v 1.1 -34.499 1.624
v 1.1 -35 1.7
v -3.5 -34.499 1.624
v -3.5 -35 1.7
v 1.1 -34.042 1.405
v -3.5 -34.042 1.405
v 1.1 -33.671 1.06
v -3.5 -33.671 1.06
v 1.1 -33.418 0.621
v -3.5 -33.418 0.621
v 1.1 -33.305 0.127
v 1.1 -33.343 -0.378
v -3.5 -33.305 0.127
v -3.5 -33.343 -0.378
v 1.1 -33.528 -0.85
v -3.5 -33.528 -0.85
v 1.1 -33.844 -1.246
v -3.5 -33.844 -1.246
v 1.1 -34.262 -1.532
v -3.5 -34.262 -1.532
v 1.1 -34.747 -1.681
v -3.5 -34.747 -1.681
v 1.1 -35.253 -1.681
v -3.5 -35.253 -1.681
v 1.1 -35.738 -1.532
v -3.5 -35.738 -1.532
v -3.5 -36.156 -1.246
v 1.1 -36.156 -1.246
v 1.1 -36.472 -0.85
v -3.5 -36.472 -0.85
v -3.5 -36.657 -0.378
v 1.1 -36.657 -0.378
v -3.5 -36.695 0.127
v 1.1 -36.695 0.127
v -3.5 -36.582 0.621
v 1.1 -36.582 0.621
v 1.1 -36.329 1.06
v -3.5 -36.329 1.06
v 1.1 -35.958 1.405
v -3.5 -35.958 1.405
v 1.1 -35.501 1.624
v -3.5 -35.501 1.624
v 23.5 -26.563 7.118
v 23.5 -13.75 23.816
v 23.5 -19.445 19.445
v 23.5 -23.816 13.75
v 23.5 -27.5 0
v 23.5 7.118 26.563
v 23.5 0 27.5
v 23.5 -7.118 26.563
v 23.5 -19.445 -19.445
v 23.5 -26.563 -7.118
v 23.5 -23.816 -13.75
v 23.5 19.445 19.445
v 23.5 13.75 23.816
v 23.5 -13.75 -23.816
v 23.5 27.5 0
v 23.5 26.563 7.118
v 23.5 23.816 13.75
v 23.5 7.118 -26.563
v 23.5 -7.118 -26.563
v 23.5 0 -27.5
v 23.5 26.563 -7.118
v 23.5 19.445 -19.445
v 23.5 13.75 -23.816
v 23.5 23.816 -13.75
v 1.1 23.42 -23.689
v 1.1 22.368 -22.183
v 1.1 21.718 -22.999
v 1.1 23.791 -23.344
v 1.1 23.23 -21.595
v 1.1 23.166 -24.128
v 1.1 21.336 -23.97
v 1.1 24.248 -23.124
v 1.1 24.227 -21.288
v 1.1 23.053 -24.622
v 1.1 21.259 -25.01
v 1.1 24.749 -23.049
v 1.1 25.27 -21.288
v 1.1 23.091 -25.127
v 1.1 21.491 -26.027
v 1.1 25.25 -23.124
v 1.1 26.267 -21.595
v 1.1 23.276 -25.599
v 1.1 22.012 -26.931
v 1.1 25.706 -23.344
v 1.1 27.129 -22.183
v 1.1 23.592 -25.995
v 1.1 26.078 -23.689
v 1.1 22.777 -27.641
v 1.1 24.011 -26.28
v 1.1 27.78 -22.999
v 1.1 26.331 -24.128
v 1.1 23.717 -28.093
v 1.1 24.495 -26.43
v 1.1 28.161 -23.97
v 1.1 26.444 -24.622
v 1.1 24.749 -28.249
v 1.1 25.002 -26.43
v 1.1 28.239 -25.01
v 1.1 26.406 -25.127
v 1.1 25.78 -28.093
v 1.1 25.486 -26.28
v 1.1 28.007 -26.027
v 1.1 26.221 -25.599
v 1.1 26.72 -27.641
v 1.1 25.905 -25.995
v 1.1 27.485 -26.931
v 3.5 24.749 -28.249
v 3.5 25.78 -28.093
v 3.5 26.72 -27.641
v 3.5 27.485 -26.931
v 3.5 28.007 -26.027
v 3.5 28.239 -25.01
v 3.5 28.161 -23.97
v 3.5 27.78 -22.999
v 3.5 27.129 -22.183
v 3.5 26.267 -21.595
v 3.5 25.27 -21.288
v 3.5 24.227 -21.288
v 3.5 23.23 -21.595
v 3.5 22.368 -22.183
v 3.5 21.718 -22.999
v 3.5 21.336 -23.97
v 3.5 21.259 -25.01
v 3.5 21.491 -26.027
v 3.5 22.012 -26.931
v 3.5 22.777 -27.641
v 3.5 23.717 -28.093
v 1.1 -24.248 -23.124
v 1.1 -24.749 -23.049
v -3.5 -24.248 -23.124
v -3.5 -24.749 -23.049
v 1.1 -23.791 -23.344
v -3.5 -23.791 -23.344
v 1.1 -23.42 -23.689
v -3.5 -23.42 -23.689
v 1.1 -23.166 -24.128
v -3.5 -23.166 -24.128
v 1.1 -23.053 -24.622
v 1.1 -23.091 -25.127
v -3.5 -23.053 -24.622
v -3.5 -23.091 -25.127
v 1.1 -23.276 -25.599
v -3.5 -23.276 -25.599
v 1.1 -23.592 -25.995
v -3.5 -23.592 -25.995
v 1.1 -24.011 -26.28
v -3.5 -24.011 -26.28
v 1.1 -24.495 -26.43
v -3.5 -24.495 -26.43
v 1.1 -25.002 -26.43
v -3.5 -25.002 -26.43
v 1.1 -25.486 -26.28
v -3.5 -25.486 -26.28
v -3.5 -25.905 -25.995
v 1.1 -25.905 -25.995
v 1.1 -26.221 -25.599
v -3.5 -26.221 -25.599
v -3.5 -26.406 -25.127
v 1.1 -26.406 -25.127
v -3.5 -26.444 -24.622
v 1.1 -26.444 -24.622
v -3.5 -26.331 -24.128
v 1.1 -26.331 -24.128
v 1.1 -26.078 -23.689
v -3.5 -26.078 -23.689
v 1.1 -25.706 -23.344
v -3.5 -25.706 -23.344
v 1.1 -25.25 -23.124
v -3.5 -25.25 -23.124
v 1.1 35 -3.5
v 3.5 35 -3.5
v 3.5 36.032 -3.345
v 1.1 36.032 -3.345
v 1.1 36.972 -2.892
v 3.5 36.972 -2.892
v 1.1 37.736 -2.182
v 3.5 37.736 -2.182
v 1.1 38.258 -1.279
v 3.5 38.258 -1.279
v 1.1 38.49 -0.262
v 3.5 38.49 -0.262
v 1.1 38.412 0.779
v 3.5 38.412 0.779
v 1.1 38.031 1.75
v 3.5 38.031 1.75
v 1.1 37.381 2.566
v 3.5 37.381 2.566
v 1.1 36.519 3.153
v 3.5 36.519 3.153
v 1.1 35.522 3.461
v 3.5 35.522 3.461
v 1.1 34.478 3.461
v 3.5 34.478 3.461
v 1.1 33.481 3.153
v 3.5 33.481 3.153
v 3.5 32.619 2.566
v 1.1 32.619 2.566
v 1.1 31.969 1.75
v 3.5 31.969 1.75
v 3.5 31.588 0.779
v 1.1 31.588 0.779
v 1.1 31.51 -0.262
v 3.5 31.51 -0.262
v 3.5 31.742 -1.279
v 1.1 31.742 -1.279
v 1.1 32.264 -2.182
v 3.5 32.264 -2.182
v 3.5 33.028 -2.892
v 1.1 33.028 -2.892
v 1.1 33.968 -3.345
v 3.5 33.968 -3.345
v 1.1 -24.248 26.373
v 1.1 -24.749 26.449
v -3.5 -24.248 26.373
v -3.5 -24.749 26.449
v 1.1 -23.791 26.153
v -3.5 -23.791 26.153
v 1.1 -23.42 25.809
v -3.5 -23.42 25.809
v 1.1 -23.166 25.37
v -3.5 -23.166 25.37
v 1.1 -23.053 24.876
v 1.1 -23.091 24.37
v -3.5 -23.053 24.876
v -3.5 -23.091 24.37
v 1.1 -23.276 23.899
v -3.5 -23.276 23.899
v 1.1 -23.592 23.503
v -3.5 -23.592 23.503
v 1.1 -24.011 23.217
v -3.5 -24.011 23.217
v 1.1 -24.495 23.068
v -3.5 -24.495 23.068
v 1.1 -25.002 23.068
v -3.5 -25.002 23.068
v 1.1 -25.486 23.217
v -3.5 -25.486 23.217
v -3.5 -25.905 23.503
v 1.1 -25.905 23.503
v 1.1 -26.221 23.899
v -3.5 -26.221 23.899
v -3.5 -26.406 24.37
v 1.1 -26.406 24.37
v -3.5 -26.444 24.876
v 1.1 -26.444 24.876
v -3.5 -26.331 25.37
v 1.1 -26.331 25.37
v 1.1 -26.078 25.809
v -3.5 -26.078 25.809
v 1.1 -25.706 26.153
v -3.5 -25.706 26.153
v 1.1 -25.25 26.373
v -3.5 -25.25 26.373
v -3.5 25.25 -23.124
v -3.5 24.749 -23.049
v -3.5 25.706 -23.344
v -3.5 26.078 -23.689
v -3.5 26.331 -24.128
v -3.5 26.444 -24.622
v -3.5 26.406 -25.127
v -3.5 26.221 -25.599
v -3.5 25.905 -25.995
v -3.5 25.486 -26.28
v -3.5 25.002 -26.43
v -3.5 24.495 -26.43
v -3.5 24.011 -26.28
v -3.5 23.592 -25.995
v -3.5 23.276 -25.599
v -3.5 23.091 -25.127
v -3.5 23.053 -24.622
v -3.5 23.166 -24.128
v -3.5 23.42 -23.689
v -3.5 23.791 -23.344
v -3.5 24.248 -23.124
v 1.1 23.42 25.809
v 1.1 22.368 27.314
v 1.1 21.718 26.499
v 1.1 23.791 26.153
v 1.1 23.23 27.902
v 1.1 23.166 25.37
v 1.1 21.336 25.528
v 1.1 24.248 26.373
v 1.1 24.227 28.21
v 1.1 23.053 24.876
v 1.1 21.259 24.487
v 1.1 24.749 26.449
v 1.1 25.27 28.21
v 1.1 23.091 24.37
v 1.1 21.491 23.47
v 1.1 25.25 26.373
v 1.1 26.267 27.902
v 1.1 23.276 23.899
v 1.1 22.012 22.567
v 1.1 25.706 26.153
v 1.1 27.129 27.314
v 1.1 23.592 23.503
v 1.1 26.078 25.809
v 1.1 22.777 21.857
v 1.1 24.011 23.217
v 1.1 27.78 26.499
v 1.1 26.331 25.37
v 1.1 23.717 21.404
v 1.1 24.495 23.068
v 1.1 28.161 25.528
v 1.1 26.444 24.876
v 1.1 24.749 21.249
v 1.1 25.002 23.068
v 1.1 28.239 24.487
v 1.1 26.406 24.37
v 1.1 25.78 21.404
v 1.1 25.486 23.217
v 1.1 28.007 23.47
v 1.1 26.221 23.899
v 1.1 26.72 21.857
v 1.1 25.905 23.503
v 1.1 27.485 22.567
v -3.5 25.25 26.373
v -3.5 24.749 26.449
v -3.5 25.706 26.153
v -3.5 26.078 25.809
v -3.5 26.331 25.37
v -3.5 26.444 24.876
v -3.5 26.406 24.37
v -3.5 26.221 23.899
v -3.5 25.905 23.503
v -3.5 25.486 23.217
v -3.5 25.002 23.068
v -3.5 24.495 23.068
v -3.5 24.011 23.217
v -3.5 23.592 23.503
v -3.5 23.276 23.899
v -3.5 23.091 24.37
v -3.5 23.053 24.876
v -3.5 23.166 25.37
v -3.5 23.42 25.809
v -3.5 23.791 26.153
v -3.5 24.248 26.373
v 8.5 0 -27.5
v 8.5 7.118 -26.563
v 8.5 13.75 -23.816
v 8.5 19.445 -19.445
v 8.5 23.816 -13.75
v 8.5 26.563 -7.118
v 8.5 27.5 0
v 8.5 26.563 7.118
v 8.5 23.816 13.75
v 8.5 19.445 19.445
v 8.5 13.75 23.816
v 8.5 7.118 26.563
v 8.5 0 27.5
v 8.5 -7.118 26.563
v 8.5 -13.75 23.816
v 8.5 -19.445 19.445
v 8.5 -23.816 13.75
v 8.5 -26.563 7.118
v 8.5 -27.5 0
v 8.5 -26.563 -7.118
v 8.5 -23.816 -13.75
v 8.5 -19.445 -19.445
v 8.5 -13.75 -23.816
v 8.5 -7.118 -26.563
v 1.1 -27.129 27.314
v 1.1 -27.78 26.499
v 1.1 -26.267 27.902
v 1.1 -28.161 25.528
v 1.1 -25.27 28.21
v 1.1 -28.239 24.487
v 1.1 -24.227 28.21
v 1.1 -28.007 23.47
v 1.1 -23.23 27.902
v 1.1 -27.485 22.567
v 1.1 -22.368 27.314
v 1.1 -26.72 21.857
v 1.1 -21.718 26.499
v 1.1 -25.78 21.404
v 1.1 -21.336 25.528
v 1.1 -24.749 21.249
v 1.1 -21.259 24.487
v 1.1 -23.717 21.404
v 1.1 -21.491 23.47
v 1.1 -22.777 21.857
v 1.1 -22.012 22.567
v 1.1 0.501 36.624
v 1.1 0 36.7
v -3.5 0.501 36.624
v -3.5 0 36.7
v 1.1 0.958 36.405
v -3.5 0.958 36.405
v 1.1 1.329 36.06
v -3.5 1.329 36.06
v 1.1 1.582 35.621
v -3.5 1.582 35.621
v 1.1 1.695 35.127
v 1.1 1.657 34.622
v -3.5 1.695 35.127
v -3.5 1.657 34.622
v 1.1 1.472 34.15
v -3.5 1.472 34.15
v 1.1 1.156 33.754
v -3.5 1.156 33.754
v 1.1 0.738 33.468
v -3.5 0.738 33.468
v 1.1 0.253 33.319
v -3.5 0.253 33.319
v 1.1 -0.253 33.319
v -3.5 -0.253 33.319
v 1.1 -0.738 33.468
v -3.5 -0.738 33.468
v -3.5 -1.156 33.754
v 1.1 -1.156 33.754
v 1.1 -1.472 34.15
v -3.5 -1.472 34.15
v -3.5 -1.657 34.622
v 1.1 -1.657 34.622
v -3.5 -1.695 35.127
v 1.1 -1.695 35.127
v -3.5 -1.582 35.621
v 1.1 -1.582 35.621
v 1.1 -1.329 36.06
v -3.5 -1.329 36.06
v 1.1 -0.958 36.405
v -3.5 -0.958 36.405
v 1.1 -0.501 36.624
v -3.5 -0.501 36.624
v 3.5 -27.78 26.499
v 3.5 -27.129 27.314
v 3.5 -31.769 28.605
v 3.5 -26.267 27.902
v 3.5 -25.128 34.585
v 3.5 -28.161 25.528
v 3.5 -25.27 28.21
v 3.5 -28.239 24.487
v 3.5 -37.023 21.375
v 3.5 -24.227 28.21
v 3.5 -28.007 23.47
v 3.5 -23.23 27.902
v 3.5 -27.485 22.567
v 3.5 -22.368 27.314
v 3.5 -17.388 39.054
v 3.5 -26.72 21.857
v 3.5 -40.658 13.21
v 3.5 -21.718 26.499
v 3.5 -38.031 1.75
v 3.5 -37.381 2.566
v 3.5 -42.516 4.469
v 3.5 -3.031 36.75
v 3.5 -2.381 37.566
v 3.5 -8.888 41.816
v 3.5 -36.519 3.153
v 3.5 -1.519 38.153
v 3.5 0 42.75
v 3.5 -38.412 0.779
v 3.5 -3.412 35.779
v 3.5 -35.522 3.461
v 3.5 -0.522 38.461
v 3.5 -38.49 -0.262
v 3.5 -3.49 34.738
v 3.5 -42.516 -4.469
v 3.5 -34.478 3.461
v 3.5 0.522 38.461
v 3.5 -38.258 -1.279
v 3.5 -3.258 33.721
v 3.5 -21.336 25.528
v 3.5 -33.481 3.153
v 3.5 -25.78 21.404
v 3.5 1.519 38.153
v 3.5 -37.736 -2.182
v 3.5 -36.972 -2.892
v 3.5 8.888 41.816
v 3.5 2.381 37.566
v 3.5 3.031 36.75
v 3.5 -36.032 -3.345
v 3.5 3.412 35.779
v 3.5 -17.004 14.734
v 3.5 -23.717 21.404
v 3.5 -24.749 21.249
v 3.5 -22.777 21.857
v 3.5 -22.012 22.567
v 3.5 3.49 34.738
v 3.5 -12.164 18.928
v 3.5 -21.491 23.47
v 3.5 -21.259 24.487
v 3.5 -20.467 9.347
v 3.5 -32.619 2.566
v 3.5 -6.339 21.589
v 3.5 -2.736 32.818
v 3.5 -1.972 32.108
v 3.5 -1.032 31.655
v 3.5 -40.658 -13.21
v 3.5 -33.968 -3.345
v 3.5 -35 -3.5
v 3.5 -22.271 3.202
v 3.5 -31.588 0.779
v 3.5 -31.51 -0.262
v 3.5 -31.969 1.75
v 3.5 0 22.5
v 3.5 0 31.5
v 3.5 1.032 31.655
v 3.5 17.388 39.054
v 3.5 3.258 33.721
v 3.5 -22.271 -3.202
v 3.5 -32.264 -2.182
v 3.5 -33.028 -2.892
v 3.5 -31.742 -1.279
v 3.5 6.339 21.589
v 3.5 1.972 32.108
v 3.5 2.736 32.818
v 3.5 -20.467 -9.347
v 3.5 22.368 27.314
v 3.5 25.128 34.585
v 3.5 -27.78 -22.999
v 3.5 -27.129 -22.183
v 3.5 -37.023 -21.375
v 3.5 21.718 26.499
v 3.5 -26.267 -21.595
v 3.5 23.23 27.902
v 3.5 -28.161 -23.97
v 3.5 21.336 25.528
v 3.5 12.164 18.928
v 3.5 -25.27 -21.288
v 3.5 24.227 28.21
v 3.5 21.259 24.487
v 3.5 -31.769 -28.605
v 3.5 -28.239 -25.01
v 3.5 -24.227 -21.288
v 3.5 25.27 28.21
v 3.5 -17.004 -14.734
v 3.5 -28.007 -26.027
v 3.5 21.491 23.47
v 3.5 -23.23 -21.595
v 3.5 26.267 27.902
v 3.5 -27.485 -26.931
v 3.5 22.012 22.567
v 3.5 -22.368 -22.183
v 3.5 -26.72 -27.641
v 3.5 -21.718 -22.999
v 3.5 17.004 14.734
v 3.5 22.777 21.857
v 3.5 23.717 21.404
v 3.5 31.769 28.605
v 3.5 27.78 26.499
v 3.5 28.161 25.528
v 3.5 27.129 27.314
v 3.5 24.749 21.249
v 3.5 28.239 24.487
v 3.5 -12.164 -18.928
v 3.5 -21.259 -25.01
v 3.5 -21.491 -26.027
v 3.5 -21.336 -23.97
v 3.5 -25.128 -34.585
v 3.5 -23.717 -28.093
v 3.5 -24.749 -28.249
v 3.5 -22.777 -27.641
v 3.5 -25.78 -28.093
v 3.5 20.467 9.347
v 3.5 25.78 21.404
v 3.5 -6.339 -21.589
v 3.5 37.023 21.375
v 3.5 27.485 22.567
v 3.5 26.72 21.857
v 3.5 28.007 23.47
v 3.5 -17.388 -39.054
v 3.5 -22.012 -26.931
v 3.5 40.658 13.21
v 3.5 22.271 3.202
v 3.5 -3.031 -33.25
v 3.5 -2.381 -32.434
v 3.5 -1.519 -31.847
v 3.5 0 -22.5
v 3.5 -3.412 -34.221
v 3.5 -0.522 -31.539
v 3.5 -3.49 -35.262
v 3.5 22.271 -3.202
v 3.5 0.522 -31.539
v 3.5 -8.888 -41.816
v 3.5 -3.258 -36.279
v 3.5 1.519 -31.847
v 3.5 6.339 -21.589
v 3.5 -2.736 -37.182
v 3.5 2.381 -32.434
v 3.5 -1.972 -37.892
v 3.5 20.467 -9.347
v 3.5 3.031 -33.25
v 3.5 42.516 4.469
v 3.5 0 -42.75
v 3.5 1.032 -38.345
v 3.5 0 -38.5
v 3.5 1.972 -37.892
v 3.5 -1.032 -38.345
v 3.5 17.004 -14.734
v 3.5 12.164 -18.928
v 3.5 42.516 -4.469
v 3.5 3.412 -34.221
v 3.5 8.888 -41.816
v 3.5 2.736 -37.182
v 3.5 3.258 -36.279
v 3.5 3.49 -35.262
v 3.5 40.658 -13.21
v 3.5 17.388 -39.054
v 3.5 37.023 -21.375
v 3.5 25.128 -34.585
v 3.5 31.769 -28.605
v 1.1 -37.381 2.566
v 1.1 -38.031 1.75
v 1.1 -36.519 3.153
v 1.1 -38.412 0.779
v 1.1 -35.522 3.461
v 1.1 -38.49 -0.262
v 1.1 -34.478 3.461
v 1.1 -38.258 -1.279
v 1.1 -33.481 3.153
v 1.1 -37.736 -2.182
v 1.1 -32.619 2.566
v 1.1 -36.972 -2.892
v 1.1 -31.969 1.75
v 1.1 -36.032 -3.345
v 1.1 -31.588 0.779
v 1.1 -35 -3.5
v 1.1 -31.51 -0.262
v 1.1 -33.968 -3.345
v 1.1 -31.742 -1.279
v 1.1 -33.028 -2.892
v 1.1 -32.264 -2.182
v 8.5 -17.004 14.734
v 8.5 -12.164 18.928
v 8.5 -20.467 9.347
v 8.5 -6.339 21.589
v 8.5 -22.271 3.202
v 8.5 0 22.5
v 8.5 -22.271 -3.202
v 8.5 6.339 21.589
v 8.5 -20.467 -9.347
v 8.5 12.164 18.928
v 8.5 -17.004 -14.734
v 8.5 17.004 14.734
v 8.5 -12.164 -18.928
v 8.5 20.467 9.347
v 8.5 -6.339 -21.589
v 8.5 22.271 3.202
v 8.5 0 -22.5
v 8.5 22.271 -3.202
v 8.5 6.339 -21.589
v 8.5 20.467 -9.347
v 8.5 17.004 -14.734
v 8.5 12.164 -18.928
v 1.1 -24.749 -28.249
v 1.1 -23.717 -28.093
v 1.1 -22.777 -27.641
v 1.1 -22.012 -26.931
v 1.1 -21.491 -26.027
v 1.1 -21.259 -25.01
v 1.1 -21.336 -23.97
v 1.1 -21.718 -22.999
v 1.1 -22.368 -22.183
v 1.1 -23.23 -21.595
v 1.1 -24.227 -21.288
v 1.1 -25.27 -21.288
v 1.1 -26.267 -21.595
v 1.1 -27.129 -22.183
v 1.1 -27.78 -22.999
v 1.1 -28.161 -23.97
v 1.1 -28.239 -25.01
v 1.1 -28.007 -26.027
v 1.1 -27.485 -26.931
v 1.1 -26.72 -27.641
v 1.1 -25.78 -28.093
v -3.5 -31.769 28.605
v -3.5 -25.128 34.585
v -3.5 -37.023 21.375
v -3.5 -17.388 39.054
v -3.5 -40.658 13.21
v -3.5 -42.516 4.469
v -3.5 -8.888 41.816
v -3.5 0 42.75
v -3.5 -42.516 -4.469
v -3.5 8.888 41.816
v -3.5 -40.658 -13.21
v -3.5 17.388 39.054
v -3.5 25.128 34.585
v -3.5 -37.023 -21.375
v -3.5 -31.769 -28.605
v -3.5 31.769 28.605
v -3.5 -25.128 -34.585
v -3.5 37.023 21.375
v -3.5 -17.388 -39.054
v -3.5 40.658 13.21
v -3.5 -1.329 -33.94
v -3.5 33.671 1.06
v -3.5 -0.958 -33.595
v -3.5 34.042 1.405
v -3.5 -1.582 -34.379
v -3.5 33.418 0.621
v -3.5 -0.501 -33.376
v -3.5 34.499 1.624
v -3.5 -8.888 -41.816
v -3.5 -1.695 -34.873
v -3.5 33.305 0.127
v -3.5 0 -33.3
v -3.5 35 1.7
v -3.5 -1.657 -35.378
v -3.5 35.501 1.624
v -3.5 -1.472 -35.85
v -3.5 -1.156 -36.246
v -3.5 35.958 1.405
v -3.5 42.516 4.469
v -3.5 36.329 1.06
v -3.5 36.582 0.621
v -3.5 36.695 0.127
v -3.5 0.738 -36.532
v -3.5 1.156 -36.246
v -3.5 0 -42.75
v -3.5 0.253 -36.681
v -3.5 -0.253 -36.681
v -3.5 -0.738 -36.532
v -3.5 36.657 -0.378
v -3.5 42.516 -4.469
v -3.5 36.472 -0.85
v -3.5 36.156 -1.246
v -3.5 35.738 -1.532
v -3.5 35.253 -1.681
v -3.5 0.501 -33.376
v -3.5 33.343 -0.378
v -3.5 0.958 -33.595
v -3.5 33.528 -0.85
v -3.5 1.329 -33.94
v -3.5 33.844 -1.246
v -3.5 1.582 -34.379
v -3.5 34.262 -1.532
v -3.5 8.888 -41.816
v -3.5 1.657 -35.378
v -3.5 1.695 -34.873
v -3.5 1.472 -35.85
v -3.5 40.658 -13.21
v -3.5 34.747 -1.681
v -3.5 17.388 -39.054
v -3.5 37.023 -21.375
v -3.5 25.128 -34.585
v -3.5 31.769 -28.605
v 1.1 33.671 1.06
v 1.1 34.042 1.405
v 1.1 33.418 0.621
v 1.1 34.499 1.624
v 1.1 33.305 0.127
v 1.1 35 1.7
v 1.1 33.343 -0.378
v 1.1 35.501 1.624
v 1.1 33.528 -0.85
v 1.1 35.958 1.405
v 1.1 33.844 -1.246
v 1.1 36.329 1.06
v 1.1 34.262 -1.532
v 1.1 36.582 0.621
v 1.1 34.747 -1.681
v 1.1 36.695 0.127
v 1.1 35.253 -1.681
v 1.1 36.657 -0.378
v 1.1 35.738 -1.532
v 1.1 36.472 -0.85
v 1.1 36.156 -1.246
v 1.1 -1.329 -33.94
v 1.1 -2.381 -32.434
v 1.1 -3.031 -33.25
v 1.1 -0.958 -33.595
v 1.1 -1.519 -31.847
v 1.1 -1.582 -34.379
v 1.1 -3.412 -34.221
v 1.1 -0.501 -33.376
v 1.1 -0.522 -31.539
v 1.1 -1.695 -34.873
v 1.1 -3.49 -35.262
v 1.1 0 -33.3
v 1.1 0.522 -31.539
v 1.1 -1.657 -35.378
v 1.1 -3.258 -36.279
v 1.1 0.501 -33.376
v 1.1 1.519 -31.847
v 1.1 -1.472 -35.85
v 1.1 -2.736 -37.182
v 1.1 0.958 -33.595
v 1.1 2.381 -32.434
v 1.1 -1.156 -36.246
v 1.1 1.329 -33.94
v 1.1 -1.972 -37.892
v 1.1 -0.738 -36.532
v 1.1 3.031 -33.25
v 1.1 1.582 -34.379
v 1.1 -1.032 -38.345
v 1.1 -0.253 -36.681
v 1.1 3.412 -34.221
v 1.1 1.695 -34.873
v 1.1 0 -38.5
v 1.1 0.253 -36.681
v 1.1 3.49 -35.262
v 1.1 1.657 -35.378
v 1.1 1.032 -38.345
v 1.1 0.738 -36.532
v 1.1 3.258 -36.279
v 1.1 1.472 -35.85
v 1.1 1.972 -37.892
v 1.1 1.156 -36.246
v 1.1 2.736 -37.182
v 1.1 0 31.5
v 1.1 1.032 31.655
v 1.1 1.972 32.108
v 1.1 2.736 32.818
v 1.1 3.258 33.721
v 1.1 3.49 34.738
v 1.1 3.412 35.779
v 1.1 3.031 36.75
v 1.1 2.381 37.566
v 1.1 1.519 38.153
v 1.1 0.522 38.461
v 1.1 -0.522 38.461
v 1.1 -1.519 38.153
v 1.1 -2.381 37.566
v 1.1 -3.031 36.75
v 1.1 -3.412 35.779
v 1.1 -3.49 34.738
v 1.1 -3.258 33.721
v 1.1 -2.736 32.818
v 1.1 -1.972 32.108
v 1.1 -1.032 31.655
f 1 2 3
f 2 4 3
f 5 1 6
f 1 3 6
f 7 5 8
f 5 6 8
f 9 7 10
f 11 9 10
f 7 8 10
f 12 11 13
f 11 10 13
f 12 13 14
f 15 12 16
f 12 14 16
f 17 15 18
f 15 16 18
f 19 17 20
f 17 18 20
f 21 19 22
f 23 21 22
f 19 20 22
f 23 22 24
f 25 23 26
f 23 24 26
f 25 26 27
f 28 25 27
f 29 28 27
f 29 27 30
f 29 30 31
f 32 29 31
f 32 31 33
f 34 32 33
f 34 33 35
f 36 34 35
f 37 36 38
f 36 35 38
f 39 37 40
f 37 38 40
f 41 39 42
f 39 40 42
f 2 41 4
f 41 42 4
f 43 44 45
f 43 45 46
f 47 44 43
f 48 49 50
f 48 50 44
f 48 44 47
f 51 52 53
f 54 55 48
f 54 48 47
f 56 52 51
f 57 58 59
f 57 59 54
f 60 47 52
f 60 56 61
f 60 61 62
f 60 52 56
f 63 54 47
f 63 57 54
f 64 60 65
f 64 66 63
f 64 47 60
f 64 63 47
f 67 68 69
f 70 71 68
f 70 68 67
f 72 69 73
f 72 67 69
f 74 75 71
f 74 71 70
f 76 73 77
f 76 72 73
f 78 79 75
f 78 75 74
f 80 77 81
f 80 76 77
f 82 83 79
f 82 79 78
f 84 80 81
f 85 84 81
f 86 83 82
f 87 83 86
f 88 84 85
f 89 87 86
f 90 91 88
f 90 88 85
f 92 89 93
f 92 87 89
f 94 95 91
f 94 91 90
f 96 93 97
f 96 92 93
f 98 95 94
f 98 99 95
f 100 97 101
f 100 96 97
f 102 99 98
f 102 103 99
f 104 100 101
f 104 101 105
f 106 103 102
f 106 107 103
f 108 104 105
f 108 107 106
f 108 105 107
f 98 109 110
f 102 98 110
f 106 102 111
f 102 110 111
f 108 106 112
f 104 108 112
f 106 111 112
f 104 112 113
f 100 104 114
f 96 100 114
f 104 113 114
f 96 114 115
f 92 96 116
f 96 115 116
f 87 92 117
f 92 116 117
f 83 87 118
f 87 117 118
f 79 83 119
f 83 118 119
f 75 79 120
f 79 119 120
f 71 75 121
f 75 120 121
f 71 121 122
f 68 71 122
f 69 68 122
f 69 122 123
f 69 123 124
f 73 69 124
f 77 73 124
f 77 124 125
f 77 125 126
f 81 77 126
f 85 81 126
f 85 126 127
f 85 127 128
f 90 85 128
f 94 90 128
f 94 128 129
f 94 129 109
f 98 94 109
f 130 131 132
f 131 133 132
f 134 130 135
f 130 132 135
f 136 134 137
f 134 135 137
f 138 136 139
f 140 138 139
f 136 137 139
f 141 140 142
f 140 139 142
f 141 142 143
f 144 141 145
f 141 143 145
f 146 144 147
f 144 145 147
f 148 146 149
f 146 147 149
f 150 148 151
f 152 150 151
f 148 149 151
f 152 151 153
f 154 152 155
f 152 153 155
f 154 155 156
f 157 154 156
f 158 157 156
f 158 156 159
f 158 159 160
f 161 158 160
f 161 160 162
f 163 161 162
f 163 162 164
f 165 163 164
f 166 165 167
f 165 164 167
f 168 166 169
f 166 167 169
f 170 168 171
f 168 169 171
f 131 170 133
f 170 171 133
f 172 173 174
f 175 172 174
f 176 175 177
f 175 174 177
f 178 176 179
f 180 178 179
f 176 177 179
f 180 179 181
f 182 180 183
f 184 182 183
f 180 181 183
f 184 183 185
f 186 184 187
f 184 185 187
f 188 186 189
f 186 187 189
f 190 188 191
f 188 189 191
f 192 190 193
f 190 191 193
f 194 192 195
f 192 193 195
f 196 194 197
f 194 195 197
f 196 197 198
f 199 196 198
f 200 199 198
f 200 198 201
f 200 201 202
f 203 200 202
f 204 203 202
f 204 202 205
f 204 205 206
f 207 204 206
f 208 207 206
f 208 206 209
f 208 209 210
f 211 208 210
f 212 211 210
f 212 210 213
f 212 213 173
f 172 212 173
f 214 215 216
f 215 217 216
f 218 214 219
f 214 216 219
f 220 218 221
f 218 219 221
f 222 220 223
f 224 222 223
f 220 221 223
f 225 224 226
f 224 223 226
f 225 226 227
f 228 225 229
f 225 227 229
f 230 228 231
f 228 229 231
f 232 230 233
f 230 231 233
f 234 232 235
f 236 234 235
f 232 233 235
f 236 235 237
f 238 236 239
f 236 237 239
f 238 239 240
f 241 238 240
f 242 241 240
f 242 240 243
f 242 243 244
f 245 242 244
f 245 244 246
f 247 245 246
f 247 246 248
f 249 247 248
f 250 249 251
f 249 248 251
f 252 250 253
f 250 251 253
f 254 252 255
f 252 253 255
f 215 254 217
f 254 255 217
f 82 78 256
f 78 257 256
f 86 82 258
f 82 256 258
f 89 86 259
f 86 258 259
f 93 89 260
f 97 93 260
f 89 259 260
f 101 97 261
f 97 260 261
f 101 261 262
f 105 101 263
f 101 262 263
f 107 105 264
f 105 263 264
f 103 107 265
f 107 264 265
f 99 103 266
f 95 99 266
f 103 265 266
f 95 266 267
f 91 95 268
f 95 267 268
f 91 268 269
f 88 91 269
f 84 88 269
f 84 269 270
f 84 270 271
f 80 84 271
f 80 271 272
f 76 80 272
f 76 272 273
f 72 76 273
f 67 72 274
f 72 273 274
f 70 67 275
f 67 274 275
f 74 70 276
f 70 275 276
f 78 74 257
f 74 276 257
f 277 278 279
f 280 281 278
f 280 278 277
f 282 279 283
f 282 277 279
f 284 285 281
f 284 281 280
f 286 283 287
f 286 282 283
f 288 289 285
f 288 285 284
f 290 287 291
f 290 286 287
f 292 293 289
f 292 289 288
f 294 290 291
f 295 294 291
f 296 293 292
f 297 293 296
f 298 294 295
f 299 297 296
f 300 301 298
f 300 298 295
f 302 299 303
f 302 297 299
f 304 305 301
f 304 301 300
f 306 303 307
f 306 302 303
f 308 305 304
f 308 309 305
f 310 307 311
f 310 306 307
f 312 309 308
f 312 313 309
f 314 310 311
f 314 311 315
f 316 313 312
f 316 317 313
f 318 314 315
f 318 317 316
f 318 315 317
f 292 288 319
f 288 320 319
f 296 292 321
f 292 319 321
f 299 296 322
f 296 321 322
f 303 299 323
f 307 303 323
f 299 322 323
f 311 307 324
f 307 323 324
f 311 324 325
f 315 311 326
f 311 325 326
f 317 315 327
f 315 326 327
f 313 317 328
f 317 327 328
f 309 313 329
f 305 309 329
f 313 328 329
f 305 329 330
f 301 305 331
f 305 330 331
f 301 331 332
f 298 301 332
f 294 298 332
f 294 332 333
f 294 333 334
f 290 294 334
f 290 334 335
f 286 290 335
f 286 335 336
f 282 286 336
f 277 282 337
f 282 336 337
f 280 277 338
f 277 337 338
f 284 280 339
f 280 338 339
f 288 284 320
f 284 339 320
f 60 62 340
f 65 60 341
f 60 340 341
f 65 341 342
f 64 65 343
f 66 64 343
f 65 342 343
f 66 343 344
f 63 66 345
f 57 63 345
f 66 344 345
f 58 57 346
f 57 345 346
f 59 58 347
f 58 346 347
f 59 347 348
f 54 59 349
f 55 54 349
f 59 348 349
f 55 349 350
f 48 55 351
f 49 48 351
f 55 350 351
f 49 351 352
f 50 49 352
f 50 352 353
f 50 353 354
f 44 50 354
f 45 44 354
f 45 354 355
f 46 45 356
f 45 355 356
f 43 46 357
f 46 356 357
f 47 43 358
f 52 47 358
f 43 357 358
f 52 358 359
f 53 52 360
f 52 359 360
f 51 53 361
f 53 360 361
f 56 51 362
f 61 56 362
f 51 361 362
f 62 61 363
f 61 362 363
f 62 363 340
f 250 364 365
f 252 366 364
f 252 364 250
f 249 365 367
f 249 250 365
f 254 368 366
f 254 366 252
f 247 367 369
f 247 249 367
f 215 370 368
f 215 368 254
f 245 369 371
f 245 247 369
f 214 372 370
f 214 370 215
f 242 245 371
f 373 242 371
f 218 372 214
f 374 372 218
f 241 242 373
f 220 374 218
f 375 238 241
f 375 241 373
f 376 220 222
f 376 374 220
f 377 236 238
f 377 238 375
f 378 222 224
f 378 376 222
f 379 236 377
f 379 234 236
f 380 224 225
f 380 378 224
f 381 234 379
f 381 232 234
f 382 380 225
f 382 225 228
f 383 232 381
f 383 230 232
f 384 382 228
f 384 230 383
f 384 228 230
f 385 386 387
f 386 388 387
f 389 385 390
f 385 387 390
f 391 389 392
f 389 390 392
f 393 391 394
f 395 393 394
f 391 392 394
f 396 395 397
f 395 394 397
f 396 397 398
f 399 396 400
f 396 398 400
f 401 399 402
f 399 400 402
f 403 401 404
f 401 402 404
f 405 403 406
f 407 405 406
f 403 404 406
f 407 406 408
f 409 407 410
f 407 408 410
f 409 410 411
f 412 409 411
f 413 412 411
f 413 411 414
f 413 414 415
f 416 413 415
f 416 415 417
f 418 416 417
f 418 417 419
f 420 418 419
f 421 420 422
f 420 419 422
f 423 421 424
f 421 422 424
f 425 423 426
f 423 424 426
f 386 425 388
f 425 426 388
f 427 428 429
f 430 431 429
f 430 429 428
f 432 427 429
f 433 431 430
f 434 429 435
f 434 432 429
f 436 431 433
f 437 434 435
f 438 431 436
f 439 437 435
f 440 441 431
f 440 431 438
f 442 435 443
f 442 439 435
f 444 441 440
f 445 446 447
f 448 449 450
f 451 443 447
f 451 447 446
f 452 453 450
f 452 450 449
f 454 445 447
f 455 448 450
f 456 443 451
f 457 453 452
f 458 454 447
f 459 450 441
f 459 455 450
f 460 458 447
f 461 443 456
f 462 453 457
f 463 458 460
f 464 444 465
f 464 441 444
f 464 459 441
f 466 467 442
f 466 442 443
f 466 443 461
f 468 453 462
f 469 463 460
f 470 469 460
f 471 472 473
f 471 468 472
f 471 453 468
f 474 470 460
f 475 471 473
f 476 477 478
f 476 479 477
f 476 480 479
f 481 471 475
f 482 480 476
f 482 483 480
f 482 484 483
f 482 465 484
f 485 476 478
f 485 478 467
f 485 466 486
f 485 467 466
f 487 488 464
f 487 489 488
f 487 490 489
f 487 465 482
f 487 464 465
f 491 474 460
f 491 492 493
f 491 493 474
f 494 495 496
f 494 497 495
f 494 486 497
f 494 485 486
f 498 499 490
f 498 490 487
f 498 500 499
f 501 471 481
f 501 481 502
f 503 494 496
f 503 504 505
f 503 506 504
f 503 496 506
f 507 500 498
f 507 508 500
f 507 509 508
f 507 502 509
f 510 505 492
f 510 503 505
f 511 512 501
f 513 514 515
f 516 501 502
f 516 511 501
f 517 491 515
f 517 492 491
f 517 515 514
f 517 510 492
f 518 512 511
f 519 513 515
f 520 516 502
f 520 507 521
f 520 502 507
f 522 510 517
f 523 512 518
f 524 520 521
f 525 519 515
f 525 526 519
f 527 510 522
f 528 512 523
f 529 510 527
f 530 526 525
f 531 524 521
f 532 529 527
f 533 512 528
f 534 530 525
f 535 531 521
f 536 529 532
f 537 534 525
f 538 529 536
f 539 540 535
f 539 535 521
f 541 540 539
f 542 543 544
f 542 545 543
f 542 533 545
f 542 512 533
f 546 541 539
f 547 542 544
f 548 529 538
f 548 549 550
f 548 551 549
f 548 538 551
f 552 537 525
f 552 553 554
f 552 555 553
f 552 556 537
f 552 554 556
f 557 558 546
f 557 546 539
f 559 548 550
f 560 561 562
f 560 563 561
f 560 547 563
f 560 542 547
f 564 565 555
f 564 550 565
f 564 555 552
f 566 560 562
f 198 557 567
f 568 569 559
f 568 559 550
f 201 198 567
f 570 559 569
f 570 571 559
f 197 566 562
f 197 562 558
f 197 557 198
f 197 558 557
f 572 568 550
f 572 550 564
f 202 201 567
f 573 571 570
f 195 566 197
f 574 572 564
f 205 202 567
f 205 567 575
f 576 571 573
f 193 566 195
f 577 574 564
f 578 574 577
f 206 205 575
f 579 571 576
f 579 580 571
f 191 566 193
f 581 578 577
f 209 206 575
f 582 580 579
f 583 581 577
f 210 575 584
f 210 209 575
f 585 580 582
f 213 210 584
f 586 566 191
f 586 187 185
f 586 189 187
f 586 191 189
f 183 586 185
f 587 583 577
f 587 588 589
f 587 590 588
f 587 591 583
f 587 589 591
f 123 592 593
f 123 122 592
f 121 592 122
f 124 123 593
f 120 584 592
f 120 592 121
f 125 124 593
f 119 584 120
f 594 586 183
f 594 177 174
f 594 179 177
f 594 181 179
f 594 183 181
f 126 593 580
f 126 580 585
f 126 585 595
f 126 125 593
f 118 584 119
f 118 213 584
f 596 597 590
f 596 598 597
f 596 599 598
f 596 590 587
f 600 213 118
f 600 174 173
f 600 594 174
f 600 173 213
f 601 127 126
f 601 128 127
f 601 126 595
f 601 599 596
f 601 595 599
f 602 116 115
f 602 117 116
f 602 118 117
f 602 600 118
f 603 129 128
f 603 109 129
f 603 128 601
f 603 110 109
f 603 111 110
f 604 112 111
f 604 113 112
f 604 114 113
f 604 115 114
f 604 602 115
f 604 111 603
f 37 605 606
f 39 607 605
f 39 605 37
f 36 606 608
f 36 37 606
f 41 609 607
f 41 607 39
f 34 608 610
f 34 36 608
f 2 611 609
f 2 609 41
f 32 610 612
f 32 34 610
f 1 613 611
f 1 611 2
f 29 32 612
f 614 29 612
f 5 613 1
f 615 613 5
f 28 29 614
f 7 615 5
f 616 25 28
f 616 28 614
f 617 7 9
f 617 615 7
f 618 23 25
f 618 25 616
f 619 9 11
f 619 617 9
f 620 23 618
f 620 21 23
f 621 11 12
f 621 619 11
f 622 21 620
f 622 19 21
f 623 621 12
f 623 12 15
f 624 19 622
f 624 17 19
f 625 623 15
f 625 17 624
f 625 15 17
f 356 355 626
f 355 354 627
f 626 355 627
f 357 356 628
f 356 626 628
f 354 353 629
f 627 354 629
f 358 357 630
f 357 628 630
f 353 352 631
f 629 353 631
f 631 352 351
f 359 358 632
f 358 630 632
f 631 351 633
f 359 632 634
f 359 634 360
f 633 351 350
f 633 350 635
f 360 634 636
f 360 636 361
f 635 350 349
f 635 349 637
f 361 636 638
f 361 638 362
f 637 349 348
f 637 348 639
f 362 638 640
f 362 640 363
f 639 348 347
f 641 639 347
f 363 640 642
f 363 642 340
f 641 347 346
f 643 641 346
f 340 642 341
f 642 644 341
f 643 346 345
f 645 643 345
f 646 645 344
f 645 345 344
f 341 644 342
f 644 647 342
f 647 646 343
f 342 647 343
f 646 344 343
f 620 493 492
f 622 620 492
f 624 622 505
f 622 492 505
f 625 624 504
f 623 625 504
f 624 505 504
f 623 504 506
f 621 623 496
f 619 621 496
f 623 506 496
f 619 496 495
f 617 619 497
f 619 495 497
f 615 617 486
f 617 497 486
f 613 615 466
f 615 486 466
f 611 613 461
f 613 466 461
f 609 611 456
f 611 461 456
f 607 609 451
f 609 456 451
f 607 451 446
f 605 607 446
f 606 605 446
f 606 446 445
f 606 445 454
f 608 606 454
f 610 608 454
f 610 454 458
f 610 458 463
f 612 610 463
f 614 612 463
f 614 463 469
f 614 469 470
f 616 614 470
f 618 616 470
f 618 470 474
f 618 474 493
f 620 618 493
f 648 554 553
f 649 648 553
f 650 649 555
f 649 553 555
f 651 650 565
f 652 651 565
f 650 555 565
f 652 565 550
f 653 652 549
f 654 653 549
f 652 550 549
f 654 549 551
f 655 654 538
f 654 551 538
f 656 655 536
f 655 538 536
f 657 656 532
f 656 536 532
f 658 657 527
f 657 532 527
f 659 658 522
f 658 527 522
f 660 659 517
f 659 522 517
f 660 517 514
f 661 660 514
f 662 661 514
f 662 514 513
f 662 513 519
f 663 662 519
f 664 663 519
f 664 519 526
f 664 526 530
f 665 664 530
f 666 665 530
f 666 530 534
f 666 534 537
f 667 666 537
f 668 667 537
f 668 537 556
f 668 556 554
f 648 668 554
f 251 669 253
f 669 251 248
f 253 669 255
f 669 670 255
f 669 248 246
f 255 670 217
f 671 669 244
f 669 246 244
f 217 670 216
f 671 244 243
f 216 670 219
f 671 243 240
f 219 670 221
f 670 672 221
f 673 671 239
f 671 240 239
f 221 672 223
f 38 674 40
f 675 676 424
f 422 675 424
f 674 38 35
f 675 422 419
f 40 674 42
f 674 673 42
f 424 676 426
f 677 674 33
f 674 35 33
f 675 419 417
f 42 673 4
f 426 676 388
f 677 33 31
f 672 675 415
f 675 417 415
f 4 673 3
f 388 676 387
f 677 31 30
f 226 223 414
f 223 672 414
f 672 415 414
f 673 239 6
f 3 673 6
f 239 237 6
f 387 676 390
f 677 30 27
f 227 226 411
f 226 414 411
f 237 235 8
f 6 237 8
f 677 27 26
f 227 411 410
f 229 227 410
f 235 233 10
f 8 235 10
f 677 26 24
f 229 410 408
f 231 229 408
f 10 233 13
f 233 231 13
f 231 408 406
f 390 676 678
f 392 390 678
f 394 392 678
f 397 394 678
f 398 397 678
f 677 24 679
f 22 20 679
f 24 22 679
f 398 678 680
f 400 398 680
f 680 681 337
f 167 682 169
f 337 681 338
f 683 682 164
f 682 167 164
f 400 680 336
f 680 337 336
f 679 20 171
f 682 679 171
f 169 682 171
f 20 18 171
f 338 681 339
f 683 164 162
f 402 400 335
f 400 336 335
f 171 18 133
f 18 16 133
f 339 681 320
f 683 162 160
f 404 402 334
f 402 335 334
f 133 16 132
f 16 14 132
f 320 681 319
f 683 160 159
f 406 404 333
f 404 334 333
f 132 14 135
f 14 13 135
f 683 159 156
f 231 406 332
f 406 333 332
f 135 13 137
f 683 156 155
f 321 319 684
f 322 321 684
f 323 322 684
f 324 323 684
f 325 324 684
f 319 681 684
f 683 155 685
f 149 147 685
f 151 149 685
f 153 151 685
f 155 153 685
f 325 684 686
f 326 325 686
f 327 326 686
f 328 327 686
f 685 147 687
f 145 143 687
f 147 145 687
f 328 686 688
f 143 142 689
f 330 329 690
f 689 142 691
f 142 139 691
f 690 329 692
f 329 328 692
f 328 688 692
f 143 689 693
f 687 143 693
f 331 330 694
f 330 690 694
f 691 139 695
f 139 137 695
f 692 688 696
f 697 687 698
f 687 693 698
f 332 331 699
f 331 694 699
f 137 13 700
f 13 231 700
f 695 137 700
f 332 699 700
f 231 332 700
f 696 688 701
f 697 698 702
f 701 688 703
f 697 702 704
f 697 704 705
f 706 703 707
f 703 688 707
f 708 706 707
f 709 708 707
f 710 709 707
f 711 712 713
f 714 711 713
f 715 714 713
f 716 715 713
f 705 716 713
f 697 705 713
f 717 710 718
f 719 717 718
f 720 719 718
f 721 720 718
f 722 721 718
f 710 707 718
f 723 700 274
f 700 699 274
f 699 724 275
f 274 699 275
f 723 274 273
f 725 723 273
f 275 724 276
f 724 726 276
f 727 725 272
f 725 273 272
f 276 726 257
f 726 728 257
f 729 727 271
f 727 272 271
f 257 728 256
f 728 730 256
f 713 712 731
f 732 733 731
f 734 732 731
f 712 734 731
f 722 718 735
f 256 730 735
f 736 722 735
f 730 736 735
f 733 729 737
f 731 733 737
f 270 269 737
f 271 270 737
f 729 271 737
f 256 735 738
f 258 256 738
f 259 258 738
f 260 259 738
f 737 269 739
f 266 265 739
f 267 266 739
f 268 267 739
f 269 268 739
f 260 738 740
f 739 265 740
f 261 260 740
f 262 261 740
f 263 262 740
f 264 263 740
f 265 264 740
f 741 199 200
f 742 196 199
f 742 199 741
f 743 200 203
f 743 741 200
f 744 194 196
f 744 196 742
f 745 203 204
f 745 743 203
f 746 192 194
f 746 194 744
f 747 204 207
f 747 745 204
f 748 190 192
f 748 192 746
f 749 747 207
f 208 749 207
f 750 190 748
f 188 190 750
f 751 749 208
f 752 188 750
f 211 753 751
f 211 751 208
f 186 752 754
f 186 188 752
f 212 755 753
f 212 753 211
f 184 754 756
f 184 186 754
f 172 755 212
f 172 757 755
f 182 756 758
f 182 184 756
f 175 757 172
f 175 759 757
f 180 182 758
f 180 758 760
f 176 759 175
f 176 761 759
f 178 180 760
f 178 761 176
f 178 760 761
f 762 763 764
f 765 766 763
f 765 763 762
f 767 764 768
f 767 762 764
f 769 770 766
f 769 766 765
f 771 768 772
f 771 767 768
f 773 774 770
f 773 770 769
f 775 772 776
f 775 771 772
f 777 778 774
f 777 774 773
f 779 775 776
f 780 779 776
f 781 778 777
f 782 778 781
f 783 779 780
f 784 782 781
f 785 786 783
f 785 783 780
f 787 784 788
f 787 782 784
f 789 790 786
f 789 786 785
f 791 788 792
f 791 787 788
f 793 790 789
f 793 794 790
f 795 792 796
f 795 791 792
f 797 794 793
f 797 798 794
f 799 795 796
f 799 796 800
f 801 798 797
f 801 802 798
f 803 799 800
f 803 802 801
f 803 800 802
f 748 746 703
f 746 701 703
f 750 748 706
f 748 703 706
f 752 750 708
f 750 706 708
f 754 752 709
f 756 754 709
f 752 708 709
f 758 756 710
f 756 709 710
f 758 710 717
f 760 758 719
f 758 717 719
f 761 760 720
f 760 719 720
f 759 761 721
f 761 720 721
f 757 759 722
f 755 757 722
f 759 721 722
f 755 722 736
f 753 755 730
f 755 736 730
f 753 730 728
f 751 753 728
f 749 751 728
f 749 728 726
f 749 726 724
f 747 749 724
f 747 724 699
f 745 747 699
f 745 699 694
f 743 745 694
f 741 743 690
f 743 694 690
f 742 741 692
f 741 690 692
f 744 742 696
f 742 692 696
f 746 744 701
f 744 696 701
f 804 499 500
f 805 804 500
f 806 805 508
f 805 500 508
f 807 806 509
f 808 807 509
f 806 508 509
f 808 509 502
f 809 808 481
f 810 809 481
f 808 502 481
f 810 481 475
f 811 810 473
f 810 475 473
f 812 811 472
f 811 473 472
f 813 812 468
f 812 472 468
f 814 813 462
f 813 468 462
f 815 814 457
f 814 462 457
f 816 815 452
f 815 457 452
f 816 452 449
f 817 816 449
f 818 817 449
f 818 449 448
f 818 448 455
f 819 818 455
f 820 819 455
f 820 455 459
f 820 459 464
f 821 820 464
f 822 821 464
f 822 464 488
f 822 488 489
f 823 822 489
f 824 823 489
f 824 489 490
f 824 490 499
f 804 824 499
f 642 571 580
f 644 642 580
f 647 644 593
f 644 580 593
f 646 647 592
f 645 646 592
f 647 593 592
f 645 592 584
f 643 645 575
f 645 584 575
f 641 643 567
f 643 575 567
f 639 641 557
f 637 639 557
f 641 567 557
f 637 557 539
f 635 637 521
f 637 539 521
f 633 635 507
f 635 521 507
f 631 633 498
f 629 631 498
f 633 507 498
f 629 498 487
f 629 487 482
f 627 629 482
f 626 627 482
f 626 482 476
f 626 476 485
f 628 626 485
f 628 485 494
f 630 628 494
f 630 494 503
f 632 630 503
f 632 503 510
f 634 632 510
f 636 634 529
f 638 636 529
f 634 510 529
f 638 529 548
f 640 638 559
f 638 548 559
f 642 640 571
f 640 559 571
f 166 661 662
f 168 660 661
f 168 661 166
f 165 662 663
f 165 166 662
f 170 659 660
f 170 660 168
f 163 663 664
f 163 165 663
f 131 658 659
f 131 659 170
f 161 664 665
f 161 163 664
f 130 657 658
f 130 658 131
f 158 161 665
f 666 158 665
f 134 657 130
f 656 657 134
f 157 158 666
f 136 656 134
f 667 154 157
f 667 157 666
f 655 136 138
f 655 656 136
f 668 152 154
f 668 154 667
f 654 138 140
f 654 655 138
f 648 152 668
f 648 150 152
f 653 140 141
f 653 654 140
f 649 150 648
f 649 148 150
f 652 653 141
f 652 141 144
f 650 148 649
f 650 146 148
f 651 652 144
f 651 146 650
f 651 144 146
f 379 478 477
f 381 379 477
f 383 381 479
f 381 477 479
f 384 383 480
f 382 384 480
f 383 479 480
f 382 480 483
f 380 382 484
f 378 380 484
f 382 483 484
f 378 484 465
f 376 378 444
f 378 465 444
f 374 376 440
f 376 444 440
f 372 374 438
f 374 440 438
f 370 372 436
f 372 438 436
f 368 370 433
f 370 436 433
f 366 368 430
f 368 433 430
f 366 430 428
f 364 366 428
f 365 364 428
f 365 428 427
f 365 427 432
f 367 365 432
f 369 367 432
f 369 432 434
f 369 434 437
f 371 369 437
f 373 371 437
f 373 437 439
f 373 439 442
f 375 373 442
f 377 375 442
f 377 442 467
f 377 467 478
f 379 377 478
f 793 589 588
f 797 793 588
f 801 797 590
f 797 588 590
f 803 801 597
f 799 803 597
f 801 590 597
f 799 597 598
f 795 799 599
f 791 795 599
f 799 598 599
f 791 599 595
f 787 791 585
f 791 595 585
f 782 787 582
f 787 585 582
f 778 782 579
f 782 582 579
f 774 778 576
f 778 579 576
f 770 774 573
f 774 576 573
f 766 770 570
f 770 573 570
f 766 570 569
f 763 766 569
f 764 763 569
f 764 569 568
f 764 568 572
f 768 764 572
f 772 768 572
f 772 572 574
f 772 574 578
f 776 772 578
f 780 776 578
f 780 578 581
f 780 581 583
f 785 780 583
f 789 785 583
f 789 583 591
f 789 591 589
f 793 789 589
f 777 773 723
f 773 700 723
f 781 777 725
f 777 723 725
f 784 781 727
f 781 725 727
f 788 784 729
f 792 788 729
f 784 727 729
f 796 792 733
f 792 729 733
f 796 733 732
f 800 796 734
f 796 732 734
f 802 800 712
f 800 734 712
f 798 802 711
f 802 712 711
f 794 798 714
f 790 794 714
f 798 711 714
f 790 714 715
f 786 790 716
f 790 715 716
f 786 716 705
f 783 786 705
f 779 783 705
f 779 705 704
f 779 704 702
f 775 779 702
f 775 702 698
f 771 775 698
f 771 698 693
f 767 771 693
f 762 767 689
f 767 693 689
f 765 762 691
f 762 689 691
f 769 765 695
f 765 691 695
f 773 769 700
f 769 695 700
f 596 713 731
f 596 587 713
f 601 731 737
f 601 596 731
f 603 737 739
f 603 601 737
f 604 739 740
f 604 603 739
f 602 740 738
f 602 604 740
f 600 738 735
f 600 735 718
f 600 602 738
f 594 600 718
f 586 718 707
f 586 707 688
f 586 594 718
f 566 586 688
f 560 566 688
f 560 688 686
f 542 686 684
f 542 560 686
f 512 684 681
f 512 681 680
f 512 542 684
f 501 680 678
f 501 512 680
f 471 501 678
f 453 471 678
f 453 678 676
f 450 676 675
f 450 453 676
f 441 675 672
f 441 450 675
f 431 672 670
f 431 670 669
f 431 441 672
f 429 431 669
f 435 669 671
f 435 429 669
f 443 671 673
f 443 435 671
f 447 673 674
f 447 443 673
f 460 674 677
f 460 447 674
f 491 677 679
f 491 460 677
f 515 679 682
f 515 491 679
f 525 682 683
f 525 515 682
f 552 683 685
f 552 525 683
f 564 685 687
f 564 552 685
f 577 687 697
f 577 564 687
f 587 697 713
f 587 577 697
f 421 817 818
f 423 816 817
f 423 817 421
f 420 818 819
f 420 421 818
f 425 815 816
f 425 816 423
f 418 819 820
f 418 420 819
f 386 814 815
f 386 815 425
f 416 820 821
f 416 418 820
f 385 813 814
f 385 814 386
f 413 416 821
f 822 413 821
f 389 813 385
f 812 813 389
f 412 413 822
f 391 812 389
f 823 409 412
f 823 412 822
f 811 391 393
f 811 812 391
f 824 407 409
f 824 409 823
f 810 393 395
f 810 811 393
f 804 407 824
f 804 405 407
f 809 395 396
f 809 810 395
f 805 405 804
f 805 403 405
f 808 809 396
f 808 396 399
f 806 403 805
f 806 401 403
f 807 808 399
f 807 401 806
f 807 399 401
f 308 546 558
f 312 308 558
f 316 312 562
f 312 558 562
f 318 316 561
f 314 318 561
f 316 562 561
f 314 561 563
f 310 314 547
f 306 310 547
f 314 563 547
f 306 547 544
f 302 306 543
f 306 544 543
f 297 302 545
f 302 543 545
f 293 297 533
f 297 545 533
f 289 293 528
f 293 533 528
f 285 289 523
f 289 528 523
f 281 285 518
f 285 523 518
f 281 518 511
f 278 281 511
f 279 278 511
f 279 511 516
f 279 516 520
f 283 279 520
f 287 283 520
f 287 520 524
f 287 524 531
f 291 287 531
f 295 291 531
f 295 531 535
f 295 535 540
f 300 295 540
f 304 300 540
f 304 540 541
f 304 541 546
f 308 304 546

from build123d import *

# Parameters (mm, degrees)
CROQUIS1_R                                           = 42.75
SALIENTE_EXTRUIR1_DEPTH                              = 3.5
REFRENTADO_PARA_TORNILLO_CON_CABEZA_TRON_D           = 3.4
REFRENTADO_PARA_TORNILLO_CON_CABEZA_TRON_DEPTH       = 20
REFRENTADO_PARA_TORNILLO_CON_CABEZA_TRON_CBORE_D     = 7
REFRENTADO_PARA_TORNILLO_CON_CABEZA_TRON_CBORE_DEPTH = 2.4
REFRENTADO_PARA_TORNILLO_CON_CABEZA_TRON_TIP         = 1.021463052
CROQUIS4_R                                           = 22.5
SALIENTE_EXTRUIR2_DEPTH                              = 5
CROQUIS5_R                                           = 27.5
SALIENTE_EXTRUIR3_DEPTH                              = 15


with BuildPart() as part:
    # Croquis1 → Saliente-Extruir1 (new, symmetric)
    with BuildSketch(Plane(origin=(0, 0, 0), x_dir=(0, 0, -1), z_dir=(1, 0, 0))):
        Circle(CROQUIS1_R)
    extrude(amount=SALIENTE_EXTRUIR1_DEPTH, both=True)

    # Refrentado para tornillo con cabeza troncocónica de M31
    with Locations(Plane(origin=(3.5, 0, 0), x_dir=(0, 0, -1), z_dir=(1, 0, 0))):
        with Locations((0, 35), (24.748737342, 24.748737342), (35, 0), (24.748737342, -24.748737342), (0, -35), (-24.748737342, -24.748737342), (-35, 0), (-24.748737342, 24.748737342)):
            CounterBoreHole(REFRENTADO_PARA_TORNILLO_CON_CABEZA_TRON_D / 2, REFRENTADO_PARA_TORNILLO_CON_CABEZA_TRON_CBORE_D / 2, REFRENTADO_PARA_TORNILLO_CON_CABEZA_TRON_CBORE_DEPTH, depth=REFRENTADO_PARA_TORNILLO_CON_CABEZA_TRON_DEPTH)
            with Locations((0, 0, -(REFRENTADO_PARA_TORNILLO_CON_CABEZA_TRON_DEPTH + REFRENTADO_PARA_TORNILLO_CON_CABEZA_TRON_TIP / 2))):  # 118° drill point
                Cone(0, REFRENTADO_PARA_TORNILLO_CON_CABEZA_TRON_D / 2, REFRENTADO_PARA_TORNILLO_CON_CABEZA_TRON_TIP, mode=Mode.SUBTRACT)

    # Croquis4 → Saliente-Extruir2 (add)
    with BuildSketch(Plane(origin=(3.5, 0, 0), x_dir=(0, 0, -1), z_dir=(1, 0, 0))):
        Circle(CROQUIS4_R)
    extrude(amount=SALIENTE_EXTRUIR2_DEPTH)

    # Croquis5 → Saliente-Extruir3 (add)
    with BuildSketch(Plane(origin=(8.5, 0, 0), x_dir=(0, 0, -1), z_dir=(1, 0, 0))):
        Circle(CROQUIS5_R)
    extrude(amount=SALIENTE_EXTRUIR3_DEPTH)


solid = part.part
